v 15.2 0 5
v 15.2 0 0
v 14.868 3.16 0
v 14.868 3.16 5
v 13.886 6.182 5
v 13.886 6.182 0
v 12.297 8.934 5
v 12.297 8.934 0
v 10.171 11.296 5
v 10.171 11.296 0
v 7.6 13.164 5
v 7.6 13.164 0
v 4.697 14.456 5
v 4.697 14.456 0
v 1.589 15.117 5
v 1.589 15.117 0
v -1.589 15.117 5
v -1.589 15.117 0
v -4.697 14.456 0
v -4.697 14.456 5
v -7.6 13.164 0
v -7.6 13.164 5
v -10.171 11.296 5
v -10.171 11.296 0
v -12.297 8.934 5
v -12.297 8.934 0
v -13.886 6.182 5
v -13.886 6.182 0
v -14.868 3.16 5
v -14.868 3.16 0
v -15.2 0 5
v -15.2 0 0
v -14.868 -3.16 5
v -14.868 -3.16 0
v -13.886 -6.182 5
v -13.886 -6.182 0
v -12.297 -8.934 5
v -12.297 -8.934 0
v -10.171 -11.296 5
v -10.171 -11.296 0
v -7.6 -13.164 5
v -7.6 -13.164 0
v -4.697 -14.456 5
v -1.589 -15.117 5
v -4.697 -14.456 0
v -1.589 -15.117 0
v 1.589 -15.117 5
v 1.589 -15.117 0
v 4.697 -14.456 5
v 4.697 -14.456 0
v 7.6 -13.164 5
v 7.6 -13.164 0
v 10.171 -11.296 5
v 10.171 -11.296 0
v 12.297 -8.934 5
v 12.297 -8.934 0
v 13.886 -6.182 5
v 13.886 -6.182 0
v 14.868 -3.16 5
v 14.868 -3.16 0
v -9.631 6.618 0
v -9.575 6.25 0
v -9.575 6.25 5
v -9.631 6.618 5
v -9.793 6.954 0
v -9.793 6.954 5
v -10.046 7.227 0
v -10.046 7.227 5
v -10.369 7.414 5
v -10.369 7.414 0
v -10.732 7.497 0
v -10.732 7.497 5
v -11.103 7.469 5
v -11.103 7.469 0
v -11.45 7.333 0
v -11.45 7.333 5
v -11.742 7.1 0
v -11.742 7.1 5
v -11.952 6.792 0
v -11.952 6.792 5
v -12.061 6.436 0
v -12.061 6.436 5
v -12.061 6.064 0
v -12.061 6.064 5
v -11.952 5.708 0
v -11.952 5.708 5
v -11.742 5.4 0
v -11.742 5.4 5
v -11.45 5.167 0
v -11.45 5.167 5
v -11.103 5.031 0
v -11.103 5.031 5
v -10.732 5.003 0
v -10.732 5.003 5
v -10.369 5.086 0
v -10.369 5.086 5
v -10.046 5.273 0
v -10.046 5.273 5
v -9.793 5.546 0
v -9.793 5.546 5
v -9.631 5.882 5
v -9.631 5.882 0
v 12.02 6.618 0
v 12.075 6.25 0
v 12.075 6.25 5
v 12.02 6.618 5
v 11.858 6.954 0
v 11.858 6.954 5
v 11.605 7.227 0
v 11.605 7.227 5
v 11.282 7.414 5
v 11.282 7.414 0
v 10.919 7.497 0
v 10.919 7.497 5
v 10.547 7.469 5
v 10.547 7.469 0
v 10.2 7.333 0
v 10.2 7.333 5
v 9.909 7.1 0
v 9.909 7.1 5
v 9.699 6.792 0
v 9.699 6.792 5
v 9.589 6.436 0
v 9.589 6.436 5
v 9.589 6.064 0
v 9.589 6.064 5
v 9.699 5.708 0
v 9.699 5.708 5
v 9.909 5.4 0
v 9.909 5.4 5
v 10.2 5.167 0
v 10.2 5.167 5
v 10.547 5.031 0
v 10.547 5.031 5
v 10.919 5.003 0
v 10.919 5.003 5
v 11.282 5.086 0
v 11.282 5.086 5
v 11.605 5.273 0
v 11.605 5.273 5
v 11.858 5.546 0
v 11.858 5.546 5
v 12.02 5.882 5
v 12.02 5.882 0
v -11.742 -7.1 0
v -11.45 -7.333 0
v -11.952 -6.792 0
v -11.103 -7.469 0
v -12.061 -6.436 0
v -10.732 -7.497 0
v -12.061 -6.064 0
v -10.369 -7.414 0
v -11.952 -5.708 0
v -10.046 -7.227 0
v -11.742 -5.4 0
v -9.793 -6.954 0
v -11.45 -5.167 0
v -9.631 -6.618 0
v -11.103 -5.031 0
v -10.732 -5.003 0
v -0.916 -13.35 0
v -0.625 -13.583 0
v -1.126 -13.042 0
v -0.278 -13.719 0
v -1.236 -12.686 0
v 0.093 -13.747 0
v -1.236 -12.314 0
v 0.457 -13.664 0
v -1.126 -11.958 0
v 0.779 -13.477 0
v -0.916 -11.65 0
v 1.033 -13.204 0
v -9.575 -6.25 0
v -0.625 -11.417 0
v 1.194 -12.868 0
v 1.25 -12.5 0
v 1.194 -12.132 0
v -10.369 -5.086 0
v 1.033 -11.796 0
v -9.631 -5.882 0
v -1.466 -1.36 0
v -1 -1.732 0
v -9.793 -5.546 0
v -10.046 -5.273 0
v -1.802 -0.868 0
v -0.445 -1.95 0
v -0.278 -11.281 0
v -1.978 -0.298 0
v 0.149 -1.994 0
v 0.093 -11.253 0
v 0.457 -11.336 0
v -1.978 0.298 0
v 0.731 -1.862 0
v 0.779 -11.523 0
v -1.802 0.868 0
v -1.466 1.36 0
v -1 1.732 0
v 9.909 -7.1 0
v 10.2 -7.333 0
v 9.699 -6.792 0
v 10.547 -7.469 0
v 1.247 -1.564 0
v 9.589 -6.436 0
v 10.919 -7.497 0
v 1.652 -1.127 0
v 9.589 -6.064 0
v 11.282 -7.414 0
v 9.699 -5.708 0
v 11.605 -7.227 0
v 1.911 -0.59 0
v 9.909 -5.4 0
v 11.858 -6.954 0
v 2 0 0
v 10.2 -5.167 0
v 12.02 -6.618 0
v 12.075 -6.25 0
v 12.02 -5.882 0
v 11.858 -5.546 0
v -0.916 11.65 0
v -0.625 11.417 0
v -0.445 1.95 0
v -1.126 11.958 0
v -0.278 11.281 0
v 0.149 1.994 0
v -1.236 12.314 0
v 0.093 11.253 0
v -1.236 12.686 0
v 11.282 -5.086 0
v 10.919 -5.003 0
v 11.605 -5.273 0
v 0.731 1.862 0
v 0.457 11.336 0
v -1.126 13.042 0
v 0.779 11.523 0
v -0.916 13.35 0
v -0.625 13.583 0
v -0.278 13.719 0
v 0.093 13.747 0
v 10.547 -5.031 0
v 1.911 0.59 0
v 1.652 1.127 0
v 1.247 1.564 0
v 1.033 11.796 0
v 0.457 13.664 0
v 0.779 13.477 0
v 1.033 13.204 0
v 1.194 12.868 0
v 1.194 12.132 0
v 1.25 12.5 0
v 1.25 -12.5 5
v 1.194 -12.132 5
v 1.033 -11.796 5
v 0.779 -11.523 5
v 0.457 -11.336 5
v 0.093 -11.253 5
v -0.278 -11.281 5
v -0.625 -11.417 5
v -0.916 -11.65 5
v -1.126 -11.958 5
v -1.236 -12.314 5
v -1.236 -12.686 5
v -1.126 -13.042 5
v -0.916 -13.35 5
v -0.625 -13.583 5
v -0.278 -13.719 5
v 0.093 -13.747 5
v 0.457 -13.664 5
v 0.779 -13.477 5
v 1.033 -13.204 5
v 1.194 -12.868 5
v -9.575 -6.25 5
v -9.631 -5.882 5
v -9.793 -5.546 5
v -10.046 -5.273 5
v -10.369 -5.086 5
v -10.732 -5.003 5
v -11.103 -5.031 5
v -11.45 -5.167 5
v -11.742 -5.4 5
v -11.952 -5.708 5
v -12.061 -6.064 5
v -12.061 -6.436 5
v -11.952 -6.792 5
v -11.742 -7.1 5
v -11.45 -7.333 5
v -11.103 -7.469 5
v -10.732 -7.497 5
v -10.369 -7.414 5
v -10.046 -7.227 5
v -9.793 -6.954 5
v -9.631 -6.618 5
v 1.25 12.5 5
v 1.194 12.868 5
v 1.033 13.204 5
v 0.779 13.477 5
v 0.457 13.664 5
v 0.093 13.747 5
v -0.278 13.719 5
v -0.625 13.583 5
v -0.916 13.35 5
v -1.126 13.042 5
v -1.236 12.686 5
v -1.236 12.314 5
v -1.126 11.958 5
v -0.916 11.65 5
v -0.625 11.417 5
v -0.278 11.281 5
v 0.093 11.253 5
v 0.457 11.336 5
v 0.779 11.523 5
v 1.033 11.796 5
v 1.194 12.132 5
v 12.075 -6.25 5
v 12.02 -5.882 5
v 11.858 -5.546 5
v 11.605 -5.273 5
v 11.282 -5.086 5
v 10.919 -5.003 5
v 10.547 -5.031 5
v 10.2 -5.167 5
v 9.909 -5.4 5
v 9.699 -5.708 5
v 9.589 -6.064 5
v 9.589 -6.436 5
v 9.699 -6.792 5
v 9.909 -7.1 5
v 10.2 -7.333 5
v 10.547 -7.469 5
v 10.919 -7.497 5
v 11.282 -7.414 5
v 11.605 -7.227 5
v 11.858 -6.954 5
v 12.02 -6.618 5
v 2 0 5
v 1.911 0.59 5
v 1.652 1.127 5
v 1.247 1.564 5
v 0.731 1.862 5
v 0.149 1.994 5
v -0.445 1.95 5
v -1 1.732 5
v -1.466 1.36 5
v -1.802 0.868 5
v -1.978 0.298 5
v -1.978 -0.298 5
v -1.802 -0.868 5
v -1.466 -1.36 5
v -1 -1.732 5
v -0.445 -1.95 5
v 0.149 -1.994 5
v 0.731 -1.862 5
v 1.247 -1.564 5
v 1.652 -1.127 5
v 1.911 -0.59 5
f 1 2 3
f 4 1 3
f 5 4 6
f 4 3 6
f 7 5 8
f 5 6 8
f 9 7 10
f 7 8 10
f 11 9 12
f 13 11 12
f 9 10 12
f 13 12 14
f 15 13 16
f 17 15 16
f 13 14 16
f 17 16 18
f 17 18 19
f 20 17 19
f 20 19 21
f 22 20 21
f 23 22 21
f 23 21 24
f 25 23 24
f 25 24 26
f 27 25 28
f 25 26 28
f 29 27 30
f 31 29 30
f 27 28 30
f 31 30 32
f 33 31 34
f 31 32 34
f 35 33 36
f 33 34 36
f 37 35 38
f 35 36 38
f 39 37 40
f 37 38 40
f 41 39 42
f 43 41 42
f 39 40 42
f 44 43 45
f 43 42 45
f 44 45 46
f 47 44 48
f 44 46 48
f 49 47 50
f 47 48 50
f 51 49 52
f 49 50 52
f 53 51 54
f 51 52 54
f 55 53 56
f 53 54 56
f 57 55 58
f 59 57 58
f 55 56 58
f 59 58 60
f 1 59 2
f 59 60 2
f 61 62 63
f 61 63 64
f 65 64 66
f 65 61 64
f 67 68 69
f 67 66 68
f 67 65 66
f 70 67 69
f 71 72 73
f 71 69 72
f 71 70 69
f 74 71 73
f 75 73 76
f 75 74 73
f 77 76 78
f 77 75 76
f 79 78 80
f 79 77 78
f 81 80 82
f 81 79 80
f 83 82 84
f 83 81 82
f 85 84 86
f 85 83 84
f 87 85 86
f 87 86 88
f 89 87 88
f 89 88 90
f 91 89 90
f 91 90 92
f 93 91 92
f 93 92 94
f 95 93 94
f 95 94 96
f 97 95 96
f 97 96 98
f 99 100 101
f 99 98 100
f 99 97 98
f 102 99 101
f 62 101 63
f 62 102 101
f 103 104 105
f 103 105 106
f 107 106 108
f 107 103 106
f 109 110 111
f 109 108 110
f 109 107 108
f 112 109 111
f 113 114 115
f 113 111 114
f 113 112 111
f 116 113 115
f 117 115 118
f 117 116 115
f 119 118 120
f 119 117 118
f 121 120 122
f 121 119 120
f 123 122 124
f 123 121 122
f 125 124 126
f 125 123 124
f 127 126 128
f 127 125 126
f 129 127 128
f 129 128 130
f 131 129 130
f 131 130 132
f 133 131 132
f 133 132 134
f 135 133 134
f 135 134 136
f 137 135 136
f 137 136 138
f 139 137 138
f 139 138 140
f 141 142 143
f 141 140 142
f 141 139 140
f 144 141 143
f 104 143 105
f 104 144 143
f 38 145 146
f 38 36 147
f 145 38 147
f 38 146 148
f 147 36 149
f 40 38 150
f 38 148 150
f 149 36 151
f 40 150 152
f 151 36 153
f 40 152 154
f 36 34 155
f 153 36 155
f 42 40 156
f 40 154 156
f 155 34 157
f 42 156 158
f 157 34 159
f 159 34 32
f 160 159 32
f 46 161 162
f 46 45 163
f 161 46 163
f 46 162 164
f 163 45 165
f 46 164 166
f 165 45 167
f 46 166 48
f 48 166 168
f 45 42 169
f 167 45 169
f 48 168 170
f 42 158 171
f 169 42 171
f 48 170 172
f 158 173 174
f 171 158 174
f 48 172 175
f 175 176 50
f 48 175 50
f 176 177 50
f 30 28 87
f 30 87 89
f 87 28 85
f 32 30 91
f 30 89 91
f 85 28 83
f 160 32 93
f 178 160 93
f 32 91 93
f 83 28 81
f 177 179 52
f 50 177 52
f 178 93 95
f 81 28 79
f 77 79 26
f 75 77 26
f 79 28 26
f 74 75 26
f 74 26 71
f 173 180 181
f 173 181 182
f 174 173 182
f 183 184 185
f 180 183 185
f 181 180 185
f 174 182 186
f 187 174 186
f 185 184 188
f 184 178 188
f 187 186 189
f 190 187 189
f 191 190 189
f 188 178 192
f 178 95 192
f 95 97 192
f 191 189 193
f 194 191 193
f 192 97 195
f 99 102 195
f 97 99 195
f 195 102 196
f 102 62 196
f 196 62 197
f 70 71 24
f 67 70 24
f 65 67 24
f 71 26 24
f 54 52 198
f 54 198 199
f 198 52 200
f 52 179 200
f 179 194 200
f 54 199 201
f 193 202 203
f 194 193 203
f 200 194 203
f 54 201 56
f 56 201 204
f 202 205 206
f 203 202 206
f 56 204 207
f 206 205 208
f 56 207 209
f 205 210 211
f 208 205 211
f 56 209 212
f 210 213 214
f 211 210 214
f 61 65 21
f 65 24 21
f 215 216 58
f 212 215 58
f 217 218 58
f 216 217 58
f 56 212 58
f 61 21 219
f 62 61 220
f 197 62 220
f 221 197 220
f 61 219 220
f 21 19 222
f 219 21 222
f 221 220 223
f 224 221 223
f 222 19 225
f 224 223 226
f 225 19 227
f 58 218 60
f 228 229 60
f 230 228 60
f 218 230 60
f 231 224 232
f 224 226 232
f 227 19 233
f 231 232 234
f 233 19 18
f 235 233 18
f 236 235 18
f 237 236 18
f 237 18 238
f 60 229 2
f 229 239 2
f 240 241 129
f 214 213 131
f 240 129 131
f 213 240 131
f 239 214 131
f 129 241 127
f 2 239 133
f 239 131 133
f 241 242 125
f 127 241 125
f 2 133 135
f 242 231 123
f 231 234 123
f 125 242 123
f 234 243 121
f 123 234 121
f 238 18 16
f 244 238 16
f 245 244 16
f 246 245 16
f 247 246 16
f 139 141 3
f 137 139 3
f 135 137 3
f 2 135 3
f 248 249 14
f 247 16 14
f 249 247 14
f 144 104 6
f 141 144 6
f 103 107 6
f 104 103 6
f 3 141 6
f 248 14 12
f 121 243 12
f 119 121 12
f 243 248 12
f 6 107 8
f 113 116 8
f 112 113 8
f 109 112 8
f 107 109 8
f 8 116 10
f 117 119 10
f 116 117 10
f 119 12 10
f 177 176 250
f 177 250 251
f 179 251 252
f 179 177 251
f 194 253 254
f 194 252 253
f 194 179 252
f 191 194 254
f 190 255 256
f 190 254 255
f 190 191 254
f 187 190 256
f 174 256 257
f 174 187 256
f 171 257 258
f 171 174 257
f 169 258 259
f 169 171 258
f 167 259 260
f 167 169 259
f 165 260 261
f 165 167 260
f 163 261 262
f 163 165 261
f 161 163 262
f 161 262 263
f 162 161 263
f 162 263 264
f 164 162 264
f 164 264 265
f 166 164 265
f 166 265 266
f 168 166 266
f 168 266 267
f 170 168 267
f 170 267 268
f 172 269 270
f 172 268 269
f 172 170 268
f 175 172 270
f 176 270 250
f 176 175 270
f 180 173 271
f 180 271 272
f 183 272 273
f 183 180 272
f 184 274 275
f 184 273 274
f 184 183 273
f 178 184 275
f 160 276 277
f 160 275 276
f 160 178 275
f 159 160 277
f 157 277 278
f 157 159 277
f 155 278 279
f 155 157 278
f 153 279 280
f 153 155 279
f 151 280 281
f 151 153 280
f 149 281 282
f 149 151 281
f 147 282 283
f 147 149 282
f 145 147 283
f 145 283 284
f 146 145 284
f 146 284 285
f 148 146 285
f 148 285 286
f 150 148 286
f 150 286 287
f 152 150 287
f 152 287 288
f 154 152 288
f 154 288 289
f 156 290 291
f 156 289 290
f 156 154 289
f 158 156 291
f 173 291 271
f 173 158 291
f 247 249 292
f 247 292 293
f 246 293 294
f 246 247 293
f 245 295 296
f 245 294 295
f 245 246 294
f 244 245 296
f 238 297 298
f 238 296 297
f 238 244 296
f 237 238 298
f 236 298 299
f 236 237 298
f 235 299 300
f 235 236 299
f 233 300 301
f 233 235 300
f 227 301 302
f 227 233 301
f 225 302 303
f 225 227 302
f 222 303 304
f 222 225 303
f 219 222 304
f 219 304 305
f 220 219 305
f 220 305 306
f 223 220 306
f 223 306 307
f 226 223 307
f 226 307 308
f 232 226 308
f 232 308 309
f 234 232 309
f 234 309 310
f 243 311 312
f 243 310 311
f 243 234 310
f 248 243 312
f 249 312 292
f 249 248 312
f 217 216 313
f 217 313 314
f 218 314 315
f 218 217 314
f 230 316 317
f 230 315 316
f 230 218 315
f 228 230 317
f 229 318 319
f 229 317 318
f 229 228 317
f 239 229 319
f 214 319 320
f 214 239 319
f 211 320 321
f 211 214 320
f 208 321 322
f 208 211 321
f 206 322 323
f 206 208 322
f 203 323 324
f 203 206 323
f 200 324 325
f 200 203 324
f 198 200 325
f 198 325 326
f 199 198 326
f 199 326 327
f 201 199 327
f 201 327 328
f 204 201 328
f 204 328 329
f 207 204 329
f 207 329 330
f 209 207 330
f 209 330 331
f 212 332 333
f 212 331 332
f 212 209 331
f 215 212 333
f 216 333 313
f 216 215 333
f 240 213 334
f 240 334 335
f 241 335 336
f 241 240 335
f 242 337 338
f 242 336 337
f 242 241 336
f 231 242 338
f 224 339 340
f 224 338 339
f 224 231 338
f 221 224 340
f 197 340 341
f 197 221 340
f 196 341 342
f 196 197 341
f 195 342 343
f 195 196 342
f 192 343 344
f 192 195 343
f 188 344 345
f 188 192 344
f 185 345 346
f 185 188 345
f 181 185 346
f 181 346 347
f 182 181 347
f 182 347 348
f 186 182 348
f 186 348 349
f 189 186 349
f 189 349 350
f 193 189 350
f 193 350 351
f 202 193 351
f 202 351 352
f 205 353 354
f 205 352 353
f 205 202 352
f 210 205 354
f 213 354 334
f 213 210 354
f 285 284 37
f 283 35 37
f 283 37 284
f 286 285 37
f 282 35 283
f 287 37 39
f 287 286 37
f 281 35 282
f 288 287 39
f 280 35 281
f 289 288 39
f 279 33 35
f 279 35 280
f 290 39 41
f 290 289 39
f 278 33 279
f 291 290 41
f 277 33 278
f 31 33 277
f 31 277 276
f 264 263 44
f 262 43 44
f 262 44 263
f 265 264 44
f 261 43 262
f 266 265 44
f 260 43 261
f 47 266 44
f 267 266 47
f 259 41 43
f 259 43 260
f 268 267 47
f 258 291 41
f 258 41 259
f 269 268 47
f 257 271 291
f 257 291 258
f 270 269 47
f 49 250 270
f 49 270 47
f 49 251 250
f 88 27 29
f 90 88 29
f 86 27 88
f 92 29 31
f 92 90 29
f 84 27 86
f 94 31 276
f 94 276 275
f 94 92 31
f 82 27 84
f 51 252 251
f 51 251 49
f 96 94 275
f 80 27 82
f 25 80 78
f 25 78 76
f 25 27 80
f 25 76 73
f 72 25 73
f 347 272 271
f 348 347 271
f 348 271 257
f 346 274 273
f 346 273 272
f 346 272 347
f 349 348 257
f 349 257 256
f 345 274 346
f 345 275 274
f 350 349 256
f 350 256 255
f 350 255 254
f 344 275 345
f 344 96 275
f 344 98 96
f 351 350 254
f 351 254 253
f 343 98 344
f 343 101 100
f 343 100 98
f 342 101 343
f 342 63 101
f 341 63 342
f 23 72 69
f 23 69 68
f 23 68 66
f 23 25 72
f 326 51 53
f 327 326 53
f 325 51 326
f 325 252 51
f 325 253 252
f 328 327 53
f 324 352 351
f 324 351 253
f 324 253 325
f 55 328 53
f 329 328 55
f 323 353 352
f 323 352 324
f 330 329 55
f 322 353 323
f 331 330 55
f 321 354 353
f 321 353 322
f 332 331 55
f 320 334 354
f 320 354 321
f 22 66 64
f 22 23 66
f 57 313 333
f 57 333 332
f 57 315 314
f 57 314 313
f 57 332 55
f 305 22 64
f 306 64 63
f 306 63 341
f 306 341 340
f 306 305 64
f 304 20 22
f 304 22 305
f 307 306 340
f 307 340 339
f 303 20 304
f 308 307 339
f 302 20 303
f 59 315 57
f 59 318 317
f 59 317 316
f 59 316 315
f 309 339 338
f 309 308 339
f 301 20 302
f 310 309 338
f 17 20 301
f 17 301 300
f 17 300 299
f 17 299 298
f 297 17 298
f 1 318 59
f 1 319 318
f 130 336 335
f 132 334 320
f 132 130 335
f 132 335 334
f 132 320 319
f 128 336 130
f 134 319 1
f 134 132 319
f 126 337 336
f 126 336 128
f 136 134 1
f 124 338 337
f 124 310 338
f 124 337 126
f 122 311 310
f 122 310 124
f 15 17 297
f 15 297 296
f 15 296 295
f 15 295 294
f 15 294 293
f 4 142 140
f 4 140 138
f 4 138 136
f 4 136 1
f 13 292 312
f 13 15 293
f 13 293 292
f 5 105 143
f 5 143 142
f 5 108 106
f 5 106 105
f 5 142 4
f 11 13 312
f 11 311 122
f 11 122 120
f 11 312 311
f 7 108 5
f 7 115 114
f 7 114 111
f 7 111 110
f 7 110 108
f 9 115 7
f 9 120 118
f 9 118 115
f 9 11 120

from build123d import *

# Parameters (mm, degrees)
SKETCH_1_R               = 15.2
EXTRUDE_2_DEPTH          = 5
CUT_EXTRUDE_1_DEPTH      = 23.069888989
CUT_EXTRUDE_1_DEPTH_BACK = 23.069888989
SKETCH_3_R               = 1.25
CUT_EXTRUDE_2_DEPTH      = 23.069888989
CUT_EXTRUDE_2_DEPTH_BACK = 23.069888989
SKETCH_4_R               = 2


with BuildPart() as part:
    # 草图1 → 凸台-拉伸2 (new body)
    with BuildSketch(Plane.XY):
        Circle(SKETCH_1_R)
    extrude(amount=EXTRUDE_2_DEPTH)

    # 草图3 → 切除-拉伸1 (cut, two sides: drawn at the far end of the back side and taken through both)
    with BuildSketch(Plane.XY.offset(5).offset(-CUT_EXTRUDE_1_DEPTH_BACK)):
        with Locations((0, 12.5)):
            Circle(SKETCH_3_R)
        with Locations((10.825317547, 6.25)):
            Circle(SKETCH_3_R)
        with Locations((10.825317547, -6.25)):
            Circle(SKETCH_3_R)
        with Locations((0, -12.5)):
            Circle(SKETCH_3_R)
        with Locations((-10.825317547, -6.25)):
            Circle(SKETCH_3_R)
        with Locations((-10.825317547, 6.25)):
            Circle(SKETCH_3_R)
    extrude(amount=CUT_EXTRUDE_1_DEPTH + CUT_EXTRUDE_1_DEPTH_BACK, mode=Mode.SUBTRACT)

    # 草图4 → 切除-拉伸2 (cut, two sides: drawn at the far end of the back side and taken through both)
    with BuildSketch(Plane.XY.offset(5).offset(-CUT_EXTRUDE_2_DEPTH_BACK)):
        Circle(SKETCH_4_R)
    extrude(amount=CUT_EXTRUDE_2_DEPTH + CUT_EXTRUDE_2_DEPTH_BACK, mode=Mode.SUBTRACT)


solid = part.part
